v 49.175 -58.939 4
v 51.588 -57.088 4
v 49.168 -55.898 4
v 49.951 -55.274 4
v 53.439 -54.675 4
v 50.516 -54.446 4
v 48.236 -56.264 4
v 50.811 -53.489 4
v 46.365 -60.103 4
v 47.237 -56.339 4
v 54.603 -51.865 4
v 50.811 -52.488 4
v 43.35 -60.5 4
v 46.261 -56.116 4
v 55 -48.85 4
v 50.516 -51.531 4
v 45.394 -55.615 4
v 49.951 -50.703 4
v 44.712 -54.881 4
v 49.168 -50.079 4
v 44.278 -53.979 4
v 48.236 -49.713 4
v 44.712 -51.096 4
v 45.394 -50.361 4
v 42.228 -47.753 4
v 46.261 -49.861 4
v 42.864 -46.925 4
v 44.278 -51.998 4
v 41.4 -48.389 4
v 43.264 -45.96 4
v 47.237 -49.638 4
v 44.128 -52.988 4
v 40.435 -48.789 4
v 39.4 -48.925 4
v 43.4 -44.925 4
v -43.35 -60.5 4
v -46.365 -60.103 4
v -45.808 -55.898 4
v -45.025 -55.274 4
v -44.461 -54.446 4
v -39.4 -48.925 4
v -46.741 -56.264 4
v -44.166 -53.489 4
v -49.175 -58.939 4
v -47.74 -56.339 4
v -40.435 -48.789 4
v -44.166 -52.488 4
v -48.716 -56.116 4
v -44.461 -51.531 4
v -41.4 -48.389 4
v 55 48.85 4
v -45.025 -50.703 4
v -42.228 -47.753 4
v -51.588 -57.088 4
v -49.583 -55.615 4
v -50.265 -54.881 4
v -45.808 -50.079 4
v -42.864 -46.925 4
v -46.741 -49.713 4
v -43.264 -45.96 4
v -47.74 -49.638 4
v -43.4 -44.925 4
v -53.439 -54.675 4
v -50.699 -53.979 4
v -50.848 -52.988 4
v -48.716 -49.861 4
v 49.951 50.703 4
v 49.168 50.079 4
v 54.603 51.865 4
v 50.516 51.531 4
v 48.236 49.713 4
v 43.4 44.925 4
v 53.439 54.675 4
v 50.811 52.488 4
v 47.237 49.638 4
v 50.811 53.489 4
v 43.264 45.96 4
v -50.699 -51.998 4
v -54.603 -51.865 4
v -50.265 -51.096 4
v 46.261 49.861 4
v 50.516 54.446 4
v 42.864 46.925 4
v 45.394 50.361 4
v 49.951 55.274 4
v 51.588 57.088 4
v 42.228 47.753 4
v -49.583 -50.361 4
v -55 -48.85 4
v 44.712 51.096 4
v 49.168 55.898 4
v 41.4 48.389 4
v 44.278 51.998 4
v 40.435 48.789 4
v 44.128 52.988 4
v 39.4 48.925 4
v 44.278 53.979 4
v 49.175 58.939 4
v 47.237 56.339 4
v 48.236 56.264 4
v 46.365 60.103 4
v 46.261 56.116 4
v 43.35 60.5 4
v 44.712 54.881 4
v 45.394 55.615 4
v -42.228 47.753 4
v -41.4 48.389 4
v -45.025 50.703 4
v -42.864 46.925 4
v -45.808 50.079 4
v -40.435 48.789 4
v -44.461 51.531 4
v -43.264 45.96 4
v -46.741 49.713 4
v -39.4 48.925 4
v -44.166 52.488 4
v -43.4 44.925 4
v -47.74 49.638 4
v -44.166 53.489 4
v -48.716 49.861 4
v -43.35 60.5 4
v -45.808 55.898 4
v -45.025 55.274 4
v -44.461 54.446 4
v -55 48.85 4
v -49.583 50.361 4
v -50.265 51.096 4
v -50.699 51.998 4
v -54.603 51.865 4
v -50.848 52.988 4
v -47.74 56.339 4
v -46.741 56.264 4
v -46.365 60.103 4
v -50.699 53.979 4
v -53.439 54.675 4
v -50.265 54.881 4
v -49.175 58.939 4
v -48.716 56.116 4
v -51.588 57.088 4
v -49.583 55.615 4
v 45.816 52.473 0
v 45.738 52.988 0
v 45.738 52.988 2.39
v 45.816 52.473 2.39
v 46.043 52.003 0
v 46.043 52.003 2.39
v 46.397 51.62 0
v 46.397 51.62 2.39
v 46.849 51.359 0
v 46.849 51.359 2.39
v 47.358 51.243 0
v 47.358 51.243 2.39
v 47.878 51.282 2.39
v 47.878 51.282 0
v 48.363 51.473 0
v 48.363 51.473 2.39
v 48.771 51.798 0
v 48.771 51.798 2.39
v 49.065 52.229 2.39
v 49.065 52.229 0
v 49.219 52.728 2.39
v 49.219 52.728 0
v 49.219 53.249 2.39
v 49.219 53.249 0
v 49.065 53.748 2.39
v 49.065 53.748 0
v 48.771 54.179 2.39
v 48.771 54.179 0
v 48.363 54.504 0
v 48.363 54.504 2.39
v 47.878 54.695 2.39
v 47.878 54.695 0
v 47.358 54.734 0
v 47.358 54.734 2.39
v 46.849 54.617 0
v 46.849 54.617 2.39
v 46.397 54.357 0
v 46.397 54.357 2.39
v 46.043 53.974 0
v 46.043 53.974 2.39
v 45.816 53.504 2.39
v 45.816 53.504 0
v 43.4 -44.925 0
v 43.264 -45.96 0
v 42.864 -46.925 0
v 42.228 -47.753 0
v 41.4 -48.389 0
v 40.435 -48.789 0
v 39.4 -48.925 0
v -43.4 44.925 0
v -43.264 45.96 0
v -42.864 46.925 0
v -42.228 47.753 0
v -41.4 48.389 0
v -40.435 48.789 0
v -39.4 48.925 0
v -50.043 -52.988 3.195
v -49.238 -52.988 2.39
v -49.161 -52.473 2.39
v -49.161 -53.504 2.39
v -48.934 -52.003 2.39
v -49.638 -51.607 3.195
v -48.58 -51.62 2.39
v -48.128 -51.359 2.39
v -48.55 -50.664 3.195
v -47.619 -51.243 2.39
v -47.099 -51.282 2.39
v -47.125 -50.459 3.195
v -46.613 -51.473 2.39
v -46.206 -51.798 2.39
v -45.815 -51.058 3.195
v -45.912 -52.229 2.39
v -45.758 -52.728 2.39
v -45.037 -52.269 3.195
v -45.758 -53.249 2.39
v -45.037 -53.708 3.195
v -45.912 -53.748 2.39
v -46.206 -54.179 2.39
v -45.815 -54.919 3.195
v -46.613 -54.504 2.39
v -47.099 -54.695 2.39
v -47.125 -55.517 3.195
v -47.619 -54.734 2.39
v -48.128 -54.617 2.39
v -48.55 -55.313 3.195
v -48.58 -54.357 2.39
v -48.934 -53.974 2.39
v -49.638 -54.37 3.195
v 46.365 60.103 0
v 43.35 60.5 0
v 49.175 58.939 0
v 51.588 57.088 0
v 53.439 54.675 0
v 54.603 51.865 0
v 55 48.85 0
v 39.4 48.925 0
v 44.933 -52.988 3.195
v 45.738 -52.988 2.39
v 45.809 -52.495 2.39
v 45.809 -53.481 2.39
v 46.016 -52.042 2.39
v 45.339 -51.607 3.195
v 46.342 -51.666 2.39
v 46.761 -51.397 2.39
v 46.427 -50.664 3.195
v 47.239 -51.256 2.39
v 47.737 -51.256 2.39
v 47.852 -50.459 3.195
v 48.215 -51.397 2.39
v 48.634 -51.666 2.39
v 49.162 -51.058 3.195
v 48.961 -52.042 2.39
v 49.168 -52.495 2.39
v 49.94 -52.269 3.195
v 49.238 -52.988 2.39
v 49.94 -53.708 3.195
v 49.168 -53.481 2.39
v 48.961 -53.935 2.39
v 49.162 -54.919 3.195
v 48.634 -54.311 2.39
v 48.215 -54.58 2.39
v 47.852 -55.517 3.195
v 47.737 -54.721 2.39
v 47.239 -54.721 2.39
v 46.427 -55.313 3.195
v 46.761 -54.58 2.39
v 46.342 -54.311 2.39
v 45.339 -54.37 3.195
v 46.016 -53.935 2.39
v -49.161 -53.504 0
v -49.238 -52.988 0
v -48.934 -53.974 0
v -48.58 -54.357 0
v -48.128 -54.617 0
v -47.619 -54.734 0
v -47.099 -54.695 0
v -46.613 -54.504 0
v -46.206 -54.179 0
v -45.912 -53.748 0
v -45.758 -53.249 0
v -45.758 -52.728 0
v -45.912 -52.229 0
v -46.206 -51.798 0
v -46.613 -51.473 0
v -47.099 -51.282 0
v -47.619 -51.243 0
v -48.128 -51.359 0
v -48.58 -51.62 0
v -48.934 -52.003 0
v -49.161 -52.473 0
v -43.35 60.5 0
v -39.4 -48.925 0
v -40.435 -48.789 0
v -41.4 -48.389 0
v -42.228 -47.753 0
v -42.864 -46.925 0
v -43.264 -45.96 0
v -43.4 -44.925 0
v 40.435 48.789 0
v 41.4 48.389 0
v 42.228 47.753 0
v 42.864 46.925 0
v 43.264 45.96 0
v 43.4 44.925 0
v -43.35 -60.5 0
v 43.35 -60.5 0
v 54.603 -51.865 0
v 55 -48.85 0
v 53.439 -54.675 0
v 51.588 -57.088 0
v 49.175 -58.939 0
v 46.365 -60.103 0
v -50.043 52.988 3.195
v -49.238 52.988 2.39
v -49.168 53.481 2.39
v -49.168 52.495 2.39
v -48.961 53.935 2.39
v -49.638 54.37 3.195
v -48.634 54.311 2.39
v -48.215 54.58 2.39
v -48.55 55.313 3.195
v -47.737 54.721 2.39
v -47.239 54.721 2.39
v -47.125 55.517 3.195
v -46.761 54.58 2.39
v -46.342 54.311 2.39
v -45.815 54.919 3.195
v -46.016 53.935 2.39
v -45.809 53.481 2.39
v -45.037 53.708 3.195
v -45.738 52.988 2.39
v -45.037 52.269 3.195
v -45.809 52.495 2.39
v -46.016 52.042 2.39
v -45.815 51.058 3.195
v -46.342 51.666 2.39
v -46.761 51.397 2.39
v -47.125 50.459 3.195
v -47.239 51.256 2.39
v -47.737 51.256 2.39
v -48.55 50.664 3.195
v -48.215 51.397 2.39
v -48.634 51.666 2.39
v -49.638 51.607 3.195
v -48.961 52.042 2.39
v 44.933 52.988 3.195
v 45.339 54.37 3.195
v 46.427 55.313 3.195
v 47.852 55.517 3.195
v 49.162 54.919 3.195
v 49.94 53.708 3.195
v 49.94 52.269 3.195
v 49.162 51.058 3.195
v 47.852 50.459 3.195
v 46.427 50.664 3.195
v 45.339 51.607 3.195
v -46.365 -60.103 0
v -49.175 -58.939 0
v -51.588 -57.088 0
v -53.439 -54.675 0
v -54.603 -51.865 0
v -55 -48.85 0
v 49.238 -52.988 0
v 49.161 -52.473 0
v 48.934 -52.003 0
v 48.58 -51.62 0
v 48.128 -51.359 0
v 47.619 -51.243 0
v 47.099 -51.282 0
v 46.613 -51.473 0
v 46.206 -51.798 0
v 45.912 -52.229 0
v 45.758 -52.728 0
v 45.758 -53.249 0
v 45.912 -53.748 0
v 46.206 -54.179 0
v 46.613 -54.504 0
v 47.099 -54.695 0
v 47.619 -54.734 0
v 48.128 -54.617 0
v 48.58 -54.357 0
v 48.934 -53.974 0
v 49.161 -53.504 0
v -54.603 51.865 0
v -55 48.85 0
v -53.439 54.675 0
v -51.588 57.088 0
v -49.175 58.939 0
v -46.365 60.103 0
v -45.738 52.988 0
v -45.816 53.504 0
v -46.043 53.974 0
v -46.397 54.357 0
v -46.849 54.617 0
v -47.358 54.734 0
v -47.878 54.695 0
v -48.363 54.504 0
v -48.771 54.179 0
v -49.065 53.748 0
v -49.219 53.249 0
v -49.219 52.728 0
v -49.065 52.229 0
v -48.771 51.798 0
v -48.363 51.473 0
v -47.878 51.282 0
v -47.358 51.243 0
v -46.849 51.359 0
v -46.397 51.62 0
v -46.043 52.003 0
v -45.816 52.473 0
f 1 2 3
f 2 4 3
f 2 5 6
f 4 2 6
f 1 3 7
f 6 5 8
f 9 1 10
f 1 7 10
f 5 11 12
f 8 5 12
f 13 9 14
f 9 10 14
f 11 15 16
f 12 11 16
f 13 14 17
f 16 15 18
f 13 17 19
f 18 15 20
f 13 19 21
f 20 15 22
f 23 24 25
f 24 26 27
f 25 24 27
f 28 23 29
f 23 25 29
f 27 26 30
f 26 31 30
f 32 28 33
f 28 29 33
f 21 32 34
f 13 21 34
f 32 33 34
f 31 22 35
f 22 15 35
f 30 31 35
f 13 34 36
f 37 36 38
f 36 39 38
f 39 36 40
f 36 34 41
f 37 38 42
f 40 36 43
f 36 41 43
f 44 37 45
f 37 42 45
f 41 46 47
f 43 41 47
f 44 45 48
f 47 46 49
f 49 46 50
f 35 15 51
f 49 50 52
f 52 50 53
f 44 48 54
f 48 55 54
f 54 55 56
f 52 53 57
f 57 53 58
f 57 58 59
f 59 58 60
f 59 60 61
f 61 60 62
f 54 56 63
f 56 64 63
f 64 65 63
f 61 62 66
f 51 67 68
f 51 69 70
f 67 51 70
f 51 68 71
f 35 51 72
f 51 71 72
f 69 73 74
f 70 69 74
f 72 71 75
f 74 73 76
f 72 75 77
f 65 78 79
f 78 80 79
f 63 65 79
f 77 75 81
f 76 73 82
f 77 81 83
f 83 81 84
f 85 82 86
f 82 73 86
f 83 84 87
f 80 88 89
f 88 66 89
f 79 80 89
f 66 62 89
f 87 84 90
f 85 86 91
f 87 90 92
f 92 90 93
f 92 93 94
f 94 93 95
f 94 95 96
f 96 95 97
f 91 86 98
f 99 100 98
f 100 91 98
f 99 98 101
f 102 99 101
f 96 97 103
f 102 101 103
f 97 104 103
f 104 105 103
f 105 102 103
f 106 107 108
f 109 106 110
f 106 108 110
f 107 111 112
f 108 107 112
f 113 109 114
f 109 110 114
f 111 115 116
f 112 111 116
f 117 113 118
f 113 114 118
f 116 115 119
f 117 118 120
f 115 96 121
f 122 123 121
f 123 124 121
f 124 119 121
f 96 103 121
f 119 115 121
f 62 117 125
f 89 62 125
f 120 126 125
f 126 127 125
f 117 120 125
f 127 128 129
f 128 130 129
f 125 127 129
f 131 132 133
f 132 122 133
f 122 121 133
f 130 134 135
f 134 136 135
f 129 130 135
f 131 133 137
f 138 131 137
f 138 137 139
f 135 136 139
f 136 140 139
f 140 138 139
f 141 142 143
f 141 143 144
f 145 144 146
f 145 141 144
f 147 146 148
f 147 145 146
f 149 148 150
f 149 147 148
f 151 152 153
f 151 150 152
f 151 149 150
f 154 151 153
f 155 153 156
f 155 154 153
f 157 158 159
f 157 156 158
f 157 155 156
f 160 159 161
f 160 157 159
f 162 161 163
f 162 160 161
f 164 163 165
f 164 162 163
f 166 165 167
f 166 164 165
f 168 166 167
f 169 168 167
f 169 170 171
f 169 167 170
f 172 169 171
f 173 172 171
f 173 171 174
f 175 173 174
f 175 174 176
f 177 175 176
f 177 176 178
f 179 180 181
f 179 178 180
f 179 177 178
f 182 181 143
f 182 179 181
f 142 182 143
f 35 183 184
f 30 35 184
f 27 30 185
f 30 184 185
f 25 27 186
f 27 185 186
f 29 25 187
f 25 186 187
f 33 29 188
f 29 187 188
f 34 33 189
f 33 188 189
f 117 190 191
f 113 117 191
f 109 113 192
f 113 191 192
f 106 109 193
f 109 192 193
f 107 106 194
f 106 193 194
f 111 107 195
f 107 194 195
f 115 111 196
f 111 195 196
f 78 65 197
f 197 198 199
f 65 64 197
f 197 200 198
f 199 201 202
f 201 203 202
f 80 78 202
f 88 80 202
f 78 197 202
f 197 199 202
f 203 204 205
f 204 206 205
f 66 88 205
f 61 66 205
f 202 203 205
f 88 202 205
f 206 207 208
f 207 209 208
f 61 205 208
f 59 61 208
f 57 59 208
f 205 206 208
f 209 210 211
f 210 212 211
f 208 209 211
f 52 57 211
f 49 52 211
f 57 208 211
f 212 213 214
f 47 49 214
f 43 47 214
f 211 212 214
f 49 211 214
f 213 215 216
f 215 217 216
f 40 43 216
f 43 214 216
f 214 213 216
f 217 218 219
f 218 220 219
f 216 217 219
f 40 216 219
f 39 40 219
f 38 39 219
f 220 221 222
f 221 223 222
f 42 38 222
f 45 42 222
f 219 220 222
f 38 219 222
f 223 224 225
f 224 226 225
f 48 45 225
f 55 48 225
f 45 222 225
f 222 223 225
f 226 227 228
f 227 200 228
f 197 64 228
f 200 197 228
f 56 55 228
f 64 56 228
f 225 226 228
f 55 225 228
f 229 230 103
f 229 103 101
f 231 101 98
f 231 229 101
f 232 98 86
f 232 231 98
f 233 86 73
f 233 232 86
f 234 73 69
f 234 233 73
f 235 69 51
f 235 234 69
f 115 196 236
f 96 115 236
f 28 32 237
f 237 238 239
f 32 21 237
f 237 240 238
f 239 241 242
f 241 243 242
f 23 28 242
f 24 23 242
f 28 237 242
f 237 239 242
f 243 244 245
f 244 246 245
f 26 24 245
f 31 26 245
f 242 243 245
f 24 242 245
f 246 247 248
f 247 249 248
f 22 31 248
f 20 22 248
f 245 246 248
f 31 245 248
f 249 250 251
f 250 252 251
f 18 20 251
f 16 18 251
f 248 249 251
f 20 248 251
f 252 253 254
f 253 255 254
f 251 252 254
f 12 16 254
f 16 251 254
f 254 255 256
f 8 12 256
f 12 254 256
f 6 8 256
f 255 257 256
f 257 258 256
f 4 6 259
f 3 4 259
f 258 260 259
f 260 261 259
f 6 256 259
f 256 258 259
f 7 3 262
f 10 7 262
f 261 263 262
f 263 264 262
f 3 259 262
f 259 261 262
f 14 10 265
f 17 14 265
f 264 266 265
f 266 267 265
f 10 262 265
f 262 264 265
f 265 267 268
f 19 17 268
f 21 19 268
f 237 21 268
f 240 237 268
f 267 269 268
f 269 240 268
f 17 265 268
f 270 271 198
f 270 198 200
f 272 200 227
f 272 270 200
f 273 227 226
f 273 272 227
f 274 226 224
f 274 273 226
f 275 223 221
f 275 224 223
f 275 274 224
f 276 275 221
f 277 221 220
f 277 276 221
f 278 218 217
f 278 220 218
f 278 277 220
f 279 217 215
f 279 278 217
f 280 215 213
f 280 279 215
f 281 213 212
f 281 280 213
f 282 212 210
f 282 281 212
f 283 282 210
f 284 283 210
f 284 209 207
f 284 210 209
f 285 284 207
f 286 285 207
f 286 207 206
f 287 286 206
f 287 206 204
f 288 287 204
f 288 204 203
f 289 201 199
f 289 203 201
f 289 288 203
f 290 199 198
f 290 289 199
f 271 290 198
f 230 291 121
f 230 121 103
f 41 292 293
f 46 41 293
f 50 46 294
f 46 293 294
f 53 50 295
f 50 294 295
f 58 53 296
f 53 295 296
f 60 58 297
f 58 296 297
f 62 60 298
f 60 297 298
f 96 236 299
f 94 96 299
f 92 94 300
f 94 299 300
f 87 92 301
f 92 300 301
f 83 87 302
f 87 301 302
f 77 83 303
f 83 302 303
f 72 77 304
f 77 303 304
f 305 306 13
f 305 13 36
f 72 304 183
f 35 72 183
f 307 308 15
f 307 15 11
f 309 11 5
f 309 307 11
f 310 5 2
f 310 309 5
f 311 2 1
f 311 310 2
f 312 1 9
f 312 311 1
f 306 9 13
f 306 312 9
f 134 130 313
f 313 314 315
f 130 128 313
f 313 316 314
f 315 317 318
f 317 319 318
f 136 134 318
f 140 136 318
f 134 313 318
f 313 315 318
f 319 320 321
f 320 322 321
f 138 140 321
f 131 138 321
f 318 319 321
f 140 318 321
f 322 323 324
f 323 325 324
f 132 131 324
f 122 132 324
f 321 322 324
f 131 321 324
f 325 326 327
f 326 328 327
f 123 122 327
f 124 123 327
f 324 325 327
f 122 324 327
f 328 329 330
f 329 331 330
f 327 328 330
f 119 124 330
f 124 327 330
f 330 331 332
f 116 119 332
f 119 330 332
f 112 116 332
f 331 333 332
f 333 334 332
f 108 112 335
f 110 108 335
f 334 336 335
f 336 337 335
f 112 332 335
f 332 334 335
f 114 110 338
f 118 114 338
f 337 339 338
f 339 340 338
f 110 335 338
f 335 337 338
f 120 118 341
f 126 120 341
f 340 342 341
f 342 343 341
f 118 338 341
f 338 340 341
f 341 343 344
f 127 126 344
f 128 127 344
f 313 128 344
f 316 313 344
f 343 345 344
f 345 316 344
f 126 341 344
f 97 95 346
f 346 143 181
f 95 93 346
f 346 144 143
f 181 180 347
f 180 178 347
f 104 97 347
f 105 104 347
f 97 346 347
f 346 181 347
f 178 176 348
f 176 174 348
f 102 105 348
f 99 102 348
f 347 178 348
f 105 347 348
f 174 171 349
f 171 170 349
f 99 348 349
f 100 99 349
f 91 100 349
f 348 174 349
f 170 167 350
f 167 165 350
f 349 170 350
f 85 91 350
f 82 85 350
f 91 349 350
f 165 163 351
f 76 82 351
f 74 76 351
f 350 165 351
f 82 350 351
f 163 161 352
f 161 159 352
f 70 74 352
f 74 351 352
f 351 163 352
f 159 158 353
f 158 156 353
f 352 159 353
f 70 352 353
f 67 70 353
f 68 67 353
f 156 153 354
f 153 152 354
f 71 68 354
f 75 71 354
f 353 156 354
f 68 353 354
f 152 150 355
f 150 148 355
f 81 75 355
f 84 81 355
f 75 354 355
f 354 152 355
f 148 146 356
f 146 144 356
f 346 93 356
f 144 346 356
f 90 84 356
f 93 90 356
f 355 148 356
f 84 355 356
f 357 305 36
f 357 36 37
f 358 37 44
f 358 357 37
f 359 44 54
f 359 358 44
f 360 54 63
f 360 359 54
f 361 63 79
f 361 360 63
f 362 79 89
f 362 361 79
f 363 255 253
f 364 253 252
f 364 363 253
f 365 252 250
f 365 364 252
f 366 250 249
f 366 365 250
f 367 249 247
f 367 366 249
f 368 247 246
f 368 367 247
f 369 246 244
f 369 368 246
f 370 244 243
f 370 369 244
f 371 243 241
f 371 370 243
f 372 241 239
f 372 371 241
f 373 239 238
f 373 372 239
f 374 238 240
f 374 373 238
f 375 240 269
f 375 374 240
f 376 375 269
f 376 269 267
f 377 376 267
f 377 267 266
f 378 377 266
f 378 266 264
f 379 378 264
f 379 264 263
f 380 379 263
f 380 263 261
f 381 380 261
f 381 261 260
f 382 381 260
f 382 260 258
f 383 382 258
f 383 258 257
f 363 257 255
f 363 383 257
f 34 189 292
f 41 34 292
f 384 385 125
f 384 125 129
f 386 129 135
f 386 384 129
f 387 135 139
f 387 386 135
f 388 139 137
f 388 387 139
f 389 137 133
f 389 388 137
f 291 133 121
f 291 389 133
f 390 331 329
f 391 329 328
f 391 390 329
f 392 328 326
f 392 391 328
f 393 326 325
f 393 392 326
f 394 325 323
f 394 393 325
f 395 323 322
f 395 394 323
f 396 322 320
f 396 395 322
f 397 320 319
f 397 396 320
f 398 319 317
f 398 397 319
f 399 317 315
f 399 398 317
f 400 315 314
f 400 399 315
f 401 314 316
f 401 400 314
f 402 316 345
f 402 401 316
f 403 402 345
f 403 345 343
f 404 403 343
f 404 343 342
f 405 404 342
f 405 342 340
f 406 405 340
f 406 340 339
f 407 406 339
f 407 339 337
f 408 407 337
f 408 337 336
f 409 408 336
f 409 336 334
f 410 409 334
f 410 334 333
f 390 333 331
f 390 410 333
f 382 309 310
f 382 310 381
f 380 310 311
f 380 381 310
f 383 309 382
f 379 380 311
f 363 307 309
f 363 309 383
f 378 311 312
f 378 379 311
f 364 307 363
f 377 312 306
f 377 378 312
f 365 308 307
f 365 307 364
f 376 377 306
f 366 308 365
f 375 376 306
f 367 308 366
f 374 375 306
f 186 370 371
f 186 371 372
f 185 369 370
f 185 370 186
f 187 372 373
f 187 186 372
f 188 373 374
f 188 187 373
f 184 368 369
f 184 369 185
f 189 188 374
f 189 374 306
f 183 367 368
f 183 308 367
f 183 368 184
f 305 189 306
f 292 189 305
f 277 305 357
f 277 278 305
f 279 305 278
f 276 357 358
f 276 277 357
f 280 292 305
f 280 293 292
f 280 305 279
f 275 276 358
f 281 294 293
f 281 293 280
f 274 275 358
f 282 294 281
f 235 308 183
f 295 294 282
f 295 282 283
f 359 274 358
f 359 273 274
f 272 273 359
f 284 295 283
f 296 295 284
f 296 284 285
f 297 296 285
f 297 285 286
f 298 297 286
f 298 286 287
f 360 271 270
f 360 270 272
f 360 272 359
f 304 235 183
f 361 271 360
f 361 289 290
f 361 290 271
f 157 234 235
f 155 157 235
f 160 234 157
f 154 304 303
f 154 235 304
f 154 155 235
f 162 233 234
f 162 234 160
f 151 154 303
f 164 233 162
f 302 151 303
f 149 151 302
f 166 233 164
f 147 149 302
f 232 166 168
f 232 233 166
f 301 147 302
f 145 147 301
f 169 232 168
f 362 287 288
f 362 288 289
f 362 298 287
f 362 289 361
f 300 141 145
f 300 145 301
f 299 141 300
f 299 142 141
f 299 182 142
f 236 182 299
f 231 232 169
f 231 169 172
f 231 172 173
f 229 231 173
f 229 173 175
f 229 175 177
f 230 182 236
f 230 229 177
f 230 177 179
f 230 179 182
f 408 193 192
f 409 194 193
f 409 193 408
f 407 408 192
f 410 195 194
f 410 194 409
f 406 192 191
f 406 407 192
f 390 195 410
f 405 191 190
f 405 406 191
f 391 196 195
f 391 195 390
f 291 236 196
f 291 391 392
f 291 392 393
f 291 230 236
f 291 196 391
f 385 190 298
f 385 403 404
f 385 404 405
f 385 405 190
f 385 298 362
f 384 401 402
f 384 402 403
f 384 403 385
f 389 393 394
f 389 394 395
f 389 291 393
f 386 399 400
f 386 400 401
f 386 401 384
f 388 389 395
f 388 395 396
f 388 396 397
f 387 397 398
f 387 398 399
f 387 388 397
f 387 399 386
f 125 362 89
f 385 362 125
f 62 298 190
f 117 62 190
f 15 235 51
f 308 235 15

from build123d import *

# Parameters (mm, degrees)
SKETCH1_R                                            = 1.75
BOSS_EXTRUDE1_DEPTH                                  = 4
CSK_FOR_M3_HEX_SOCKET_COUNTERSUNK_CAP_SC_D           = 3.4
CSK_FOR_M3_HEX_SOCKET_COUNTERSUNK_CAP_SC_CSINK_D     = 6.72
CSK_FOR_M3_HEX_SOCKET_COUNTERSUNK_CAP_SC_CSINK_ANGLE = 90


with BuildPart() as part:
    # Sketch1 → Boss-Extrude1 (new body)
    with BuildSketch(Plane.XY):
        with BuildLine():
            Line((43.35, -60.5), (-43.35, -60.5))
            ThreePointArc((-43.35, -60.5), (-51.587794001, -57.087794001), (-55, -48.85))
            Line((-55, -48.85), (-55, 48.85))
            ThreePointArc((-55, 48.85), (-51.587794001, 57.087794001), (-43.35, 60.5))
            Line((-43.35, 60.5), (43.35, 60.5))
            ThreePointArc((43.35, 60.5), (51.587794001, 57.087794001), (55, 48.85))
            Line((55, 48.85), (55, -48.85))
            ThreePointArc((55, -48.85), (51.587794001, -57.087794001), (43.35, -60.5))
        make_face()
        with Locations((-47.488440649, 52.988440649)):
            Circle(SKETCH1_R, mode=Mode.SUBTRACT)
        with Locations(Location((47.488440649, 52.988440649, 0), (0, 0, 180))):
            Circle(SKETCH1_R, mode=Mode.SUBTRACT)
        with Locations((47.488440649, -52.988440649)):
            Circle(SKETCH1_R, mode=Mode.SUBTRACT)
        with Locations(Location((-47.488440649, -52.988440649, 0), (0, 0, 180))):
            Circle(SKETCH1_R, mode=Mode.SUBTRACT)
        with BuildLine():
            Line((39.4, -48.925), (-39.4, -48.925))
            ThreePointArc((-39.4, -48.925), (-42.228427125, -47.753427125), (-43.4, -44.925))
            Line((-43.4, -44.925), (-43.4, 44.925))
            ThreePointArc((-43.4, 44.925), (-42.228427125, 47.753427125), (-39.4, 48.925))
            Line((-39.4, 48.925), (39.4, 48.925))
            ThreePointArc((39.4, 48.925), (42.228427125, 47.753427125), (43.4, 44.925))
            Line((43.4, 44.925), (43.4, -44.925))
            ThreePointArc((43.4, -44.925), (42.228427125, -47.753427125), (39.4, -48.925))
        make_face(mode=Mode.SUBTRACT)
    extrude(amount=BOSS_EXTRUDE1_DEPTH)

    # CSK for M3 Hex Socket Countersunk Cap Screw1 (through all)
    with Locations(Plane.XY.offset(4)):
        with Locations((-47.488440649, -52.988440649), (47.488440649, -52.988440649), (47.488440649, 52.988440649), (-47.488440649, 52.988440649)):
            CounterSinkHole(CSK_FOR_M3_HEX_SOCKET_COUNTERSUNK_CAP_SC_D / 2, CSK_FOR_M3_HEX_SOCKET_COUNTERSUNK_CAP_SC_CSINK_D / 2, counter_sink_angle=CSK_FOR_M3_HEX_SOCKET_COUNTERSUNK_CAP_SC_CSINK_ANGLE)


solid = part.part
